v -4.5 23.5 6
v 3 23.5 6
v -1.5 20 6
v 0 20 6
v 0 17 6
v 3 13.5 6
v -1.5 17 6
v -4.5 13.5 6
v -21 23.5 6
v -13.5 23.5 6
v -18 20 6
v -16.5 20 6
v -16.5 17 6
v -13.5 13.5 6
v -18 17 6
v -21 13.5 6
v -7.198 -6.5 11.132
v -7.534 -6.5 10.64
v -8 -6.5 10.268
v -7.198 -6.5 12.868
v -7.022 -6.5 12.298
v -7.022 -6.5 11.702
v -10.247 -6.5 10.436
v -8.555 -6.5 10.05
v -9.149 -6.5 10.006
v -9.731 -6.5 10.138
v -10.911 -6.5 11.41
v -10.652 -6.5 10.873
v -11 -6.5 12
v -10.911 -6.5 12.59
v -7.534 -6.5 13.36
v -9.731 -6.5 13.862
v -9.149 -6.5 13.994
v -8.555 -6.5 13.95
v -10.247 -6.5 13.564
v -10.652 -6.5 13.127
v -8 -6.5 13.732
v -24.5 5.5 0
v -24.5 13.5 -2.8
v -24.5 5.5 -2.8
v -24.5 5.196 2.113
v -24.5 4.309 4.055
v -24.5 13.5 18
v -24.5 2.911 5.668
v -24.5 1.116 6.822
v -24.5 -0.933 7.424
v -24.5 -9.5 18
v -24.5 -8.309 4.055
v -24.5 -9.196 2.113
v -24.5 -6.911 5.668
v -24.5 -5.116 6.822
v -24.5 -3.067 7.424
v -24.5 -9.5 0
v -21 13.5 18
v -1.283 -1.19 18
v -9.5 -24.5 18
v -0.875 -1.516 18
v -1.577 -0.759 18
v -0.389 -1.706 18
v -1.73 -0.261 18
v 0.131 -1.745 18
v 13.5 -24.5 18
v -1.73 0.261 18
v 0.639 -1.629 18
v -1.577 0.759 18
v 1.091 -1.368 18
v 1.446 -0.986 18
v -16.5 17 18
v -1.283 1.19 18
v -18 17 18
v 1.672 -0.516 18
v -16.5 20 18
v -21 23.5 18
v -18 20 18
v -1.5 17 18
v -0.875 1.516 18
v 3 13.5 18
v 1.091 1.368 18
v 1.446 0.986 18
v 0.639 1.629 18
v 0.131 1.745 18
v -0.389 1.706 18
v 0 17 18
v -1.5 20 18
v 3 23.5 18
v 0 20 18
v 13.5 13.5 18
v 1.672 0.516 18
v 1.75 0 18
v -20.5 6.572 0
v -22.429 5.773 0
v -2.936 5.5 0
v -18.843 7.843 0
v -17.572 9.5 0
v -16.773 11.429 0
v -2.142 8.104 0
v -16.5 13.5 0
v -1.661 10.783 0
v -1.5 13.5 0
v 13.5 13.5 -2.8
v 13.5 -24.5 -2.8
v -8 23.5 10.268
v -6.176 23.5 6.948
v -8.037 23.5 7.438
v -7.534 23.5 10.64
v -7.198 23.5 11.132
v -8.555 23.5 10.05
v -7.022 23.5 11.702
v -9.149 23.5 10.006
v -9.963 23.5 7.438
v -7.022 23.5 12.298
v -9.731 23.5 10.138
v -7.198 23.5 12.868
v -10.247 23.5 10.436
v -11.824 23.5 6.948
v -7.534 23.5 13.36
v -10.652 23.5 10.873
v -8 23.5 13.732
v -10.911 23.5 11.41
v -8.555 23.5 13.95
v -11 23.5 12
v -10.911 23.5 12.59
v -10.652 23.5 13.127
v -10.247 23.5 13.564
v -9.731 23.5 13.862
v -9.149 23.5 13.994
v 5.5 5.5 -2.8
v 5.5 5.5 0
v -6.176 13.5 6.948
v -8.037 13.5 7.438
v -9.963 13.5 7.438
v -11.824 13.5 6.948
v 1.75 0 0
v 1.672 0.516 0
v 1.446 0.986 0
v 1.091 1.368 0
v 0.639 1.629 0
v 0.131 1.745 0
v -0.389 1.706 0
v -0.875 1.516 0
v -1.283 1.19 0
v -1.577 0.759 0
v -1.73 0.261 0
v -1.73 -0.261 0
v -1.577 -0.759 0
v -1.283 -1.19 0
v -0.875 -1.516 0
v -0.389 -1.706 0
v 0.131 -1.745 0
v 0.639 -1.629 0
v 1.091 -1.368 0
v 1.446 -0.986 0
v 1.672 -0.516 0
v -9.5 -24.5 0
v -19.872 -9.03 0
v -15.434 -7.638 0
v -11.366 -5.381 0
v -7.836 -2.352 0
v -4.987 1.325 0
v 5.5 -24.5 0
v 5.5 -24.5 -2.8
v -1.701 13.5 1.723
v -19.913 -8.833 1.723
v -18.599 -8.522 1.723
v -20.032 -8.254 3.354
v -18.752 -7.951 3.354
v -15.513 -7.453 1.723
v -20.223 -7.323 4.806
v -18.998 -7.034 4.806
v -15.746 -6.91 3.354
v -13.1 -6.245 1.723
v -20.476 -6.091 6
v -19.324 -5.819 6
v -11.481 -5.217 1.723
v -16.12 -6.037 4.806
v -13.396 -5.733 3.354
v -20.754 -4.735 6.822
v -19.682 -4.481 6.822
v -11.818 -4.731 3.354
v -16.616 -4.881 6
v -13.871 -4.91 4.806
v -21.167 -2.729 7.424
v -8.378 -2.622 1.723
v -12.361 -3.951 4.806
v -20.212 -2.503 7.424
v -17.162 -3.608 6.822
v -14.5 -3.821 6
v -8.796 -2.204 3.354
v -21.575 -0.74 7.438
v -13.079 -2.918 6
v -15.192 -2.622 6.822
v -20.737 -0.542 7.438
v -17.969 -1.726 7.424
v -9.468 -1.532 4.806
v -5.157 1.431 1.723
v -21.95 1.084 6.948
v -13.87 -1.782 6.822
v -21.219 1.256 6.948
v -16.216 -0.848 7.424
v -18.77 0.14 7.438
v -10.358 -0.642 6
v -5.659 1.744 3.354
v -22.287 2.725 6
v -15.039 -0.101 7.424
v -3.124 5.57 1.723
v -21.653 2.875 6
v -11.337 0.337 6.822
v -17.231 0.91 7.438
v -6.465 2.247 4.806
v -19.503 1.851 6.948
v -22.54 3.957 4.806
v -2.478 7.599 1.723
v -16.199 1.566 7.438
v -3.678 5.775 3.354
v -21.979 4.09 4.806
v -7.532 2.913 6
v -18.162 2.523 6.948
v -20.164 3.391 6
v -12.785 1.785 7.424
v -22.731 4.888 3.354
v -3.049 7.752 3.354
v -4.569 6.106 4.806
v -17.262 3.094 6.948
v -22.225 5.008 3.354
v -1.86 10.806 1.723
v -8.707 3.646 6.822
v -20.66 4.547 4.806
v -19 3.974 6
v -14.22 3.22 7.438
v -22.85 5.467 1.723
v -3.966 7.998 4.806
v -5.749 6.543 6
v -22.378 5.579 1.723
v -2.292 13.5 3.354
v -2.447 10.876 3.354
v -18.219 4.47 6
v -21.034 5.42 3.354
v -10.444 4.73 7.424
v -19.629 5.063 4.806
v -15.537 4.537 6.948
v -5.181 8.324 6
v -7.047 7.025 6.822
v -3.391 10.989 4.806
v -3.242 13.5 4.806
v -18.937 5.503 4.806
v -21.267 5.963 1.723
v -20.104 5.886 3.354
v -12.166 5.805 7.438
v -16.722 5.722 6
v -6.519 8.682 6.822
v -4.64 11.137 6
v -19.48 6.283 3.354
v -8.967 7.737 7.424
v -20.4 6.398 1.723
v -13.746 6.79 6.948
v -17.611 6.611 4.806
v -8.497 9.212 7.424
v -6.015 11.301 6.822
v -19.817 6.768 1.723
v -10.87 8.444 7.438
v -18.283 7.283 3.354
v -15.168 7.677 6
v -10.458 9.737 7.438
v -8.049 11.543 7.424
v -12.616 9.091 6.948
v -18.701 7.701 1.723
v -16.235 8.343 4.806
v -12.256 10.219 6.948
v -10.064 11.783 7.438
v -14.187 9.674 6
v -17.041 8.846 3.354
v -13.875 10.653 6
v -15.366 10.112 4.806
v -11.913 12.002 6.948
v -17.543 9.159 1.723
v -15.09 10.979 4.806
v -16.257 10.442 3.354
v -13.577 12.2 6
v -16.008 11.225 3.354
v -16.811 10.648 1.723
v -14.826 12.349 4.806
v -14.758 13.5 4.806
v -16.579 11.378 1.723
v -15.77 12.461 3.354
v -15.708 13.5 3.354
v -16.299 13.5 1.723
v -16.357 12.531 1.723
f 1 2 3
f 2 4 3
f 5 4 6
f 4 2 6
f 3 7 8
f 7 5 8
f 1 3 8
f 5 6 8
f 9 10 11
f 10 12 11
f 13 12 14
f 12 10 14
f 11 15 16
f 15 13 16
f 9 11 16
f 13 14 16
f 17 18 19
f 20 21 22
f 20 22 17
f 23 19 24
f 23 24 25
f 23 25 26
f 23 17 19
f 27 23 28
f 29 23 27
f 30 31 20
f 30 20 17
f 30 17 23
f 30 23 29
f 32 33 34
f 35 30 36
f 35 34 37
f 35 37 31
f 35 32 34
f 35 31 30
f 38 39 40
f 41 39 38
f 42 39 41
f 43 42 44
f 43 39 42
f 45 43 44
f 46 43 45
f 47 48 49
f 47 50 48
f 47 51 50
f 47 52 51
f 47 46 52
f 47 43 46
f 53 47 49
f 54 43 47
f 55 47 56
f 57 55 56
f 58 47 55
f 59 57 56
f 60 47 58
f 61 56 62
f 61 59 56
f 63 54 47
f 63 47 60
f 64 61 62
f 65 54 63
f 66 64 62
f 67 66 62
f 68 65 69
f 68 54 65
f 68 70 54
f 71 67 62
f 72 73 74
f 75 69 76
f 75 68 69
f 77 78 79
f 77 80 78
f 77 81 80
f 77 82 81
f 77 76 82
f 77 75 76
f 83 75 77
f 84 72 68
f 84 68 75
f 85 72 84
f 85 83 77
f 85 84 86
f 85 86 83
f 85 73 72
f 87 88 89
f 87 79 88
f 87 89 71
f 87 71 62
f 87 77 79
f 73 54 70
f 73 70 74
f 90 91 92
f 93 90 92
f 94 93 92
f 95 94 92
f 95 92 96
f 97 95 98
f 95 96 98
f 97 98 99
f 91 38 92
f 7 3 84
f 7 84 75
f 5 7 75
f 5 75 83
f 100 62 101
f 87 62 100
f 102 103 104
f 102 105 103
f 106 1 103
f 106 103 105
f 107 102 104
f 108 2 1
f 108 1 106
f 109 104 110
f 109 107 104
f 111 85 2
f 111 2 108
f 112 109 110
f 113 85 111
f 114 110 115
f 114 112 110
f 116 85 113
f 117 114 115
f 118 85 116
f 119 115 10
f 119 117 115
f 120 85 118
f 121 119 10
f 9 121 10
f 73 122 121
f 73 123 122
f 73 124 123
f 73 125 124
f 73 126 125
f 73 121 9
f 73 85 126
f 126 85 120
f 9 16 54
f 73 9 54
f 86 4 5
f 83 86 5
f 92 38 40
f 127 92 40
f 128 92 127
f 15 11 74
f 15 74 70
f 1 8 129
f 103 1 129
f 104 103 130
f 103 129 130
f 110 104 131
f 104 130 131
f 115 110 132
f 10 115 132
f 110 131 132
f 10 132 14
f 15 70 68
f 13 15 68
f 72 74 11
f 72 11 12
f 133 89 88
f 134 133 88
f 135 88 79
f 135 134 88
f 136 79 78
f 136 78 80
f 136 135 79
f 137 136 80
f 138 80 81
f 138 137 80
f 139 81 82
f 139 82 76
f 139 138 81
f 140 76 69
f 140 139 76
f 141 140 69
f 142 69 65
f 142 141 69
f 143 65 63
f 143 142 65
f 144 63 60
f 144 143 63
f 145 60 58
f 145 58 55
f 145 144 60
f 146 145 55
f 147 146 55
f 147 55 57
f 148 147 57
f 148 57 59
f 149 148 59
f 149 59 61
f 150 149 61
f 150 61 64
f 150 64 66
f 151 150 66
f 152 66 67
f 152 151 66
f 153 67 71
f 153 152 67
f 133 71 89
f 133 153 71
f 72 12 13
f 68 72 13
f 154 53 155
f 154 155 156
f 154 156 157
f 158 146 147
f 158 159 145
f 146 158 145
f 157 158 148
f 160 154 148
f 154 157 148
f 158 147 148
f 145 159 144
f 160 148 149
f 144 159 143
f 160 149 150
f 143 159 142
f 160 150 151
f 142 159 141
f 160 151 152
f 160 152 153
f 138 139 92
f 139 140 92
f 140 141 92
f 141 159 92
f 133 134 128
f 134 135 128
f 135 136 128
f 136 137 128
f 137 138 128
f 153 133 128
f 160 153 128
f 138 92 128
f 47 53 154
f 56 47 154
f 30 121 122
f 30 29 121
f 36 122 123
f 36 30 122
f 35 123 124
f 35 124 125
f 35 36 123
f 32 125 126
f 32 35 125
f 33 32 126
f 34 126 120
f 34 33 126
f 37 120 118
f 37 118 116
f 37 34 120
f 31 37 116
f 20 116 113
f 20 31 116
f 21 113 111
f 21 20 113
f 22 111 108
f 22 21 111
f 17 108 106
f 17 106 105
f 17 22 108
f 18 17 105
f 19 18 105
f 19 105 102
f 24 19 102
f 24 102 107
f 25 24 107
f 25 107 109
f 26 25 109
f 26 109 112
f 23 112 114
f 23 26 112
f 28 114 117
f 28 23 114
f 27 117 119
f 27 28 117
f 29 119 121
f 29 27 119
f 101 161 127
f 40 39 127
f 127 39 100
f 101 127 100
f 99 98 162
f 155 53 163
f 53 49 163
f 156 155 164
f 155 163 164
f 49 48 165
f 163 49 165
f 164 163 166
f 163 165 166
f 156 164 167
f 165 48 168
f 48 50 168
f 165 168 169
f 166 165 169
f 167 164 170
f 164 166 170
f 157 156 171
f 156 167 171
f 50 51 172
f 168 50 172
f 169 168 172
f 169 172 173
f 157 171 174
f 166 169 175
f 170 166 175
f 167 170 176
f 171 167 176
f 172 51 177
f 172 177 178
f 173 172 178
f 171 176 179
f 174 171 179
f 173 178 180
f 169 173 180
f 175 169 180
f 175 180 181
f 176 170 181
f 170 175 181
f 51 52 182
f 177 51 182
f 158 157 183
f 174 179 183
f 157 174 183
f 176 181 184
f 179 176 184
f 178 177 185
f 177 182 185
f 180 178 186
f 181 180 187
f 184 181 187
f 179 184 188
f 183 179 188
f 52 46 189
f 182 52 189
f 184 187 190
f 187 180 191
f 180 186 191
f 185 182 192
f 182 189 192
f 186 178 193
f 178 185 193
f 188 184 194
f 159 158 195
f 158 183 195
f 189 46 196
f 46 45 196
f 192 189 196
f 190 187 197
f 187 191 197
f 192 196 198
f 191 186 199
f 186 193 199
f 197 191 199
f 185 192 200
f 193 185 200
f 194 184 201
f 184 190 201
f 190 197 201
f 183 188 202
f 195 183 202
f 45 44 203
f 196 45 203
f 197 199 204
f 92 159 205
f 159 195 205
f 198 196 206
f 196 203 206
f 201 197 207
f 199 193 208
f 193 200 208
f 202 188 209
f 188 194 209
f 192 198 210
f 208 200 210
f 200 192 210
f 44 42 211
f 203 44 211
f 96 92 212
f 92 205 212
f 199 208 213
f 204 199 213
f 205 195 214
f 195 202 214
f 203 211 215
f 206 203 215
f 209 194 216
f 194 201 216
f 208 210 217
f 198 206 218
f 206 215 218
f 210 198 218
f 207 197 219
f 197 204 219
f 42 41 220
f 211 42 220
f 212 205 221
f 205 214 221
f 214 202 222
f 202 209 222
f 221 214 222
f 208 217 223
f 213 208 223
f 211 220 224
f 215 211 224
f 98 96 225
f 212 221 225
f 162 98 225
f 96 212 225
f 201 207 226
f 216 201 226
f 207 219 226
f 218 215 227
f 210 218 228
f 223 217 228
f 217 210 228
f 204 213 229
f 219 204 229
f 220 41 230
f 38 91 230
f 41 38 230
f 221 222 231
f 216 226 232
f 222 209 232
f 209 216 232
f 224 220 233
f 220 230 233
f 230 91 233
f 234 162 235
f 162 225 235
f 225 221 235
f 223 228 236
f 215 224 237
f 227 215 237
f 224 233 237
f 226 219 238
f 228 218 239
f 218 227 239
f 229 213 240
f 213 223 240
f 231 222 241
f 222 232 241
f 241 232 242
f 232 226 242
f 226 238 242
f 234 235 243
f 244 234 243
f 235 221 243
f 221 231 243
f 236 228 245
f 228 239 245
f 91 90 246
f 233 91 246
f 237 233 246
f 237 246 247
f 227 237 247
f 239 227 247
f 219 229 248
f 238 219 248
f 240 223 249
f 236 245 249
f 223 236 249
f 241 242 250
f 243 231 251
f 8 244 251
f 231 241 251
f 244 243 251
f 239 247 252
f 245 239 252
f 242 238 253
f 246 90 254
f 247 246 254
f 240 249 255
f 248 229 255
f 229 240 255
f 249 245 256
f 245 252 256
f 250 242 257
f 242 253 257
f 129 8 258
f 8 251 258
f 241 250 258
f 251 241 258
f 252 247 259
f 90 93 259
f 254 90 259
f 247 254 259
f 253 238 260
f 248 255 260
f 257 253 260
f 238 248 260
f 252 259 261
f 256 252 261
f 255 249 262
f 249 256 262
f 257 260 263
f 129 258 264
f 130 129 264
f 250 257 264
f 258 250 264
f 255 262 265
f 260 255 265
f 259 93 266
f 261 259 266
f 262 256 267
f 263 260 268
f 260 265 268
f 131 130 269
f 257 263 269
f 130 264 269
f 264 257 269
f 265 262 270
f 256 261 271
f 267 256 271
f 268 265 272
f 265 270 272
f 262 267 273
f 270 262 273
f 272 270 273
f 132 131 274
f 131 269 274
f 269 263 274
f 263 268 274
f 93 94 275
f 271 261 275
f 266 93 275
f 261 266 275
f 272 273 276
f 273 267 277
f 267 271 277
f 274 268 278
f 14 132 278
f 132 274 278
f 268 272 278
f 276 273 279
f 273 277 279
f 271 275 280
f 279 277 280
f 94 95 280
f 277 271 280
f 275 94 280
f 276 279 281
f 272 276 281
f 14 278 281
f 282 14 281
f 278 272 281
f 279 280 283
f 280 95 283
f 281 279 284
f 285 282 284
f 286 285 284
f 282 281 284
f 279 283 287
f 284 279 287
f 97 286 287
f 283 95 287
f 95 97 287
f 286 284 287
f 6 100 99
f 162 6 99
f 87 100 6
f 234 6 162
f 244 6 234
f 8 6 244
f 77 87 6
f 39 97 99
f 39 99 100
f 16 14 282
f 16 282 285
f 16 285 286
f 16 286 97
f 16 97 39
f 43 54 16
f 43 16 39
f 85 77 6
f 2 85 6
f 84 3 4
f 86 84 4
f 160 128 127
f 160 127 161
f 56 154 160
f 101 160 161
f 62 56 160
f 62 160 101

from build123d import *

# Parameters (mm, degrees)
F0_R      = 1.75
F1_DEPTH  = 18
F2_DEPTH  = 2.8
F6_R      = 2
F7_DEPTH  = 10
F8_DEPTH  = 20
F9_W      = 1.5
F9_H      = 3
F10_DEPTH = 25


with BuildPart() as f1:
    # F0 (on Top) → F1 (new body)
    with BuildSketch(Plane.XY):
        Polygon((5.5, -24.5), (5.5, 0), (5.5, 5.5), (0, 5.5), (-24.5, 5.5), (-24.5, -9.5), (-9.5, -24.5), align=None)
        Circle(F0_R, mode=Mode.SUBTRACT)
        Polygon((5.5, 5.5), (5.5, 0), (5.5, -24.5), (13.5, -24.5), (13.5, 0), (13.5, 13.5), (0, 13.5), (-24.5, 13.5), (-24.5, 5.5), (0, 5.5), align=None)
    extrude(amount=F1_DEPTH)

    # F0 (on Top) → F2 (join)
    with BuildSketch(Plane.XY):
        Polygon((5.5, 5.5), (5.5, 0), (5.5, -24.5), (13.5, -24.5), (13.5, 0), (13.5, 13.5), (0, 13.5), (-24.5, 13.5), (-24.5, 5.5), (0, 5.5), align=None)
    extrude(amount=-F2_DEPTH)

    # F5: sweep along a path in F3
    with BuildLine(Plane.XY) as f5_path:
        ThreePointArc((-24.5, -2), (-13.5398448916, 2.5398448916), (-9, 13.5))
    # F4 (on face) → F5 (sweep, cut)
    with BuildSketch(Plane(origin=(-24.5, 0, 0), x_dir=(0, -1, 0), z_dir=(-1, 0, 0))):
        with BuildLine():
            Line((-5.5, 0), (9.5, 0))
            ThreePointArc((9.5, 0), (2, 7.5), (-5.5, 0))
        make_face()
    sweep(path=f5_path.line, mode=Mode.SUBTRACT)

    # F6 (on face) → F7 (join)
    with BuildSketch(Plane(origin=(0, 13.5, 0), x_dir=(-1, 0, 0), z_dir=(0, 1, 0))):
        with BuildLine():
            Line((21, 6), (21, 18))
            Line((21, 18), (-3, 18))
            Line((-3, 18), (-3, 6))
            Line((-3, 6), (4.5, 6))
            ThreePointArc((4.5, 6), (9, 7.5), (13.5, 6))
            Line((13.5, 6), (21, 6))
        make_face()
        with Locations((9, 12)):
            Circle(F6_R, mode=Mode.SUBTRACT)
    extrude(amount=F7_DEPTH)

    # F8 (cut): a face of the model
    f8_faces = [f1.faces().sort_by_distance(p)[0] for p in [
        (-9, 13.5, 12),
    ]]
    extrude(f8_faces, amount=-F8_DEPTH, mode=Mode.SUBTRACT)

    # F9 (on face) → F10 (cut)
    with BuildSketch(Plane(origin=(0, 0, 6), x_dir=(1, 0, 0), z_dir=(0, 0, -1))):
        with Locations((-17.25, -18.5)):
            Rectangle(F9_W, F9_H)
        with Locations((-0.75, -18.5)):
            Rectangle(F9_W, F9_H)
    extrude(amount=-F10_DEPTH, mode=Mode.SUBTRACT)


solid = f1.part
